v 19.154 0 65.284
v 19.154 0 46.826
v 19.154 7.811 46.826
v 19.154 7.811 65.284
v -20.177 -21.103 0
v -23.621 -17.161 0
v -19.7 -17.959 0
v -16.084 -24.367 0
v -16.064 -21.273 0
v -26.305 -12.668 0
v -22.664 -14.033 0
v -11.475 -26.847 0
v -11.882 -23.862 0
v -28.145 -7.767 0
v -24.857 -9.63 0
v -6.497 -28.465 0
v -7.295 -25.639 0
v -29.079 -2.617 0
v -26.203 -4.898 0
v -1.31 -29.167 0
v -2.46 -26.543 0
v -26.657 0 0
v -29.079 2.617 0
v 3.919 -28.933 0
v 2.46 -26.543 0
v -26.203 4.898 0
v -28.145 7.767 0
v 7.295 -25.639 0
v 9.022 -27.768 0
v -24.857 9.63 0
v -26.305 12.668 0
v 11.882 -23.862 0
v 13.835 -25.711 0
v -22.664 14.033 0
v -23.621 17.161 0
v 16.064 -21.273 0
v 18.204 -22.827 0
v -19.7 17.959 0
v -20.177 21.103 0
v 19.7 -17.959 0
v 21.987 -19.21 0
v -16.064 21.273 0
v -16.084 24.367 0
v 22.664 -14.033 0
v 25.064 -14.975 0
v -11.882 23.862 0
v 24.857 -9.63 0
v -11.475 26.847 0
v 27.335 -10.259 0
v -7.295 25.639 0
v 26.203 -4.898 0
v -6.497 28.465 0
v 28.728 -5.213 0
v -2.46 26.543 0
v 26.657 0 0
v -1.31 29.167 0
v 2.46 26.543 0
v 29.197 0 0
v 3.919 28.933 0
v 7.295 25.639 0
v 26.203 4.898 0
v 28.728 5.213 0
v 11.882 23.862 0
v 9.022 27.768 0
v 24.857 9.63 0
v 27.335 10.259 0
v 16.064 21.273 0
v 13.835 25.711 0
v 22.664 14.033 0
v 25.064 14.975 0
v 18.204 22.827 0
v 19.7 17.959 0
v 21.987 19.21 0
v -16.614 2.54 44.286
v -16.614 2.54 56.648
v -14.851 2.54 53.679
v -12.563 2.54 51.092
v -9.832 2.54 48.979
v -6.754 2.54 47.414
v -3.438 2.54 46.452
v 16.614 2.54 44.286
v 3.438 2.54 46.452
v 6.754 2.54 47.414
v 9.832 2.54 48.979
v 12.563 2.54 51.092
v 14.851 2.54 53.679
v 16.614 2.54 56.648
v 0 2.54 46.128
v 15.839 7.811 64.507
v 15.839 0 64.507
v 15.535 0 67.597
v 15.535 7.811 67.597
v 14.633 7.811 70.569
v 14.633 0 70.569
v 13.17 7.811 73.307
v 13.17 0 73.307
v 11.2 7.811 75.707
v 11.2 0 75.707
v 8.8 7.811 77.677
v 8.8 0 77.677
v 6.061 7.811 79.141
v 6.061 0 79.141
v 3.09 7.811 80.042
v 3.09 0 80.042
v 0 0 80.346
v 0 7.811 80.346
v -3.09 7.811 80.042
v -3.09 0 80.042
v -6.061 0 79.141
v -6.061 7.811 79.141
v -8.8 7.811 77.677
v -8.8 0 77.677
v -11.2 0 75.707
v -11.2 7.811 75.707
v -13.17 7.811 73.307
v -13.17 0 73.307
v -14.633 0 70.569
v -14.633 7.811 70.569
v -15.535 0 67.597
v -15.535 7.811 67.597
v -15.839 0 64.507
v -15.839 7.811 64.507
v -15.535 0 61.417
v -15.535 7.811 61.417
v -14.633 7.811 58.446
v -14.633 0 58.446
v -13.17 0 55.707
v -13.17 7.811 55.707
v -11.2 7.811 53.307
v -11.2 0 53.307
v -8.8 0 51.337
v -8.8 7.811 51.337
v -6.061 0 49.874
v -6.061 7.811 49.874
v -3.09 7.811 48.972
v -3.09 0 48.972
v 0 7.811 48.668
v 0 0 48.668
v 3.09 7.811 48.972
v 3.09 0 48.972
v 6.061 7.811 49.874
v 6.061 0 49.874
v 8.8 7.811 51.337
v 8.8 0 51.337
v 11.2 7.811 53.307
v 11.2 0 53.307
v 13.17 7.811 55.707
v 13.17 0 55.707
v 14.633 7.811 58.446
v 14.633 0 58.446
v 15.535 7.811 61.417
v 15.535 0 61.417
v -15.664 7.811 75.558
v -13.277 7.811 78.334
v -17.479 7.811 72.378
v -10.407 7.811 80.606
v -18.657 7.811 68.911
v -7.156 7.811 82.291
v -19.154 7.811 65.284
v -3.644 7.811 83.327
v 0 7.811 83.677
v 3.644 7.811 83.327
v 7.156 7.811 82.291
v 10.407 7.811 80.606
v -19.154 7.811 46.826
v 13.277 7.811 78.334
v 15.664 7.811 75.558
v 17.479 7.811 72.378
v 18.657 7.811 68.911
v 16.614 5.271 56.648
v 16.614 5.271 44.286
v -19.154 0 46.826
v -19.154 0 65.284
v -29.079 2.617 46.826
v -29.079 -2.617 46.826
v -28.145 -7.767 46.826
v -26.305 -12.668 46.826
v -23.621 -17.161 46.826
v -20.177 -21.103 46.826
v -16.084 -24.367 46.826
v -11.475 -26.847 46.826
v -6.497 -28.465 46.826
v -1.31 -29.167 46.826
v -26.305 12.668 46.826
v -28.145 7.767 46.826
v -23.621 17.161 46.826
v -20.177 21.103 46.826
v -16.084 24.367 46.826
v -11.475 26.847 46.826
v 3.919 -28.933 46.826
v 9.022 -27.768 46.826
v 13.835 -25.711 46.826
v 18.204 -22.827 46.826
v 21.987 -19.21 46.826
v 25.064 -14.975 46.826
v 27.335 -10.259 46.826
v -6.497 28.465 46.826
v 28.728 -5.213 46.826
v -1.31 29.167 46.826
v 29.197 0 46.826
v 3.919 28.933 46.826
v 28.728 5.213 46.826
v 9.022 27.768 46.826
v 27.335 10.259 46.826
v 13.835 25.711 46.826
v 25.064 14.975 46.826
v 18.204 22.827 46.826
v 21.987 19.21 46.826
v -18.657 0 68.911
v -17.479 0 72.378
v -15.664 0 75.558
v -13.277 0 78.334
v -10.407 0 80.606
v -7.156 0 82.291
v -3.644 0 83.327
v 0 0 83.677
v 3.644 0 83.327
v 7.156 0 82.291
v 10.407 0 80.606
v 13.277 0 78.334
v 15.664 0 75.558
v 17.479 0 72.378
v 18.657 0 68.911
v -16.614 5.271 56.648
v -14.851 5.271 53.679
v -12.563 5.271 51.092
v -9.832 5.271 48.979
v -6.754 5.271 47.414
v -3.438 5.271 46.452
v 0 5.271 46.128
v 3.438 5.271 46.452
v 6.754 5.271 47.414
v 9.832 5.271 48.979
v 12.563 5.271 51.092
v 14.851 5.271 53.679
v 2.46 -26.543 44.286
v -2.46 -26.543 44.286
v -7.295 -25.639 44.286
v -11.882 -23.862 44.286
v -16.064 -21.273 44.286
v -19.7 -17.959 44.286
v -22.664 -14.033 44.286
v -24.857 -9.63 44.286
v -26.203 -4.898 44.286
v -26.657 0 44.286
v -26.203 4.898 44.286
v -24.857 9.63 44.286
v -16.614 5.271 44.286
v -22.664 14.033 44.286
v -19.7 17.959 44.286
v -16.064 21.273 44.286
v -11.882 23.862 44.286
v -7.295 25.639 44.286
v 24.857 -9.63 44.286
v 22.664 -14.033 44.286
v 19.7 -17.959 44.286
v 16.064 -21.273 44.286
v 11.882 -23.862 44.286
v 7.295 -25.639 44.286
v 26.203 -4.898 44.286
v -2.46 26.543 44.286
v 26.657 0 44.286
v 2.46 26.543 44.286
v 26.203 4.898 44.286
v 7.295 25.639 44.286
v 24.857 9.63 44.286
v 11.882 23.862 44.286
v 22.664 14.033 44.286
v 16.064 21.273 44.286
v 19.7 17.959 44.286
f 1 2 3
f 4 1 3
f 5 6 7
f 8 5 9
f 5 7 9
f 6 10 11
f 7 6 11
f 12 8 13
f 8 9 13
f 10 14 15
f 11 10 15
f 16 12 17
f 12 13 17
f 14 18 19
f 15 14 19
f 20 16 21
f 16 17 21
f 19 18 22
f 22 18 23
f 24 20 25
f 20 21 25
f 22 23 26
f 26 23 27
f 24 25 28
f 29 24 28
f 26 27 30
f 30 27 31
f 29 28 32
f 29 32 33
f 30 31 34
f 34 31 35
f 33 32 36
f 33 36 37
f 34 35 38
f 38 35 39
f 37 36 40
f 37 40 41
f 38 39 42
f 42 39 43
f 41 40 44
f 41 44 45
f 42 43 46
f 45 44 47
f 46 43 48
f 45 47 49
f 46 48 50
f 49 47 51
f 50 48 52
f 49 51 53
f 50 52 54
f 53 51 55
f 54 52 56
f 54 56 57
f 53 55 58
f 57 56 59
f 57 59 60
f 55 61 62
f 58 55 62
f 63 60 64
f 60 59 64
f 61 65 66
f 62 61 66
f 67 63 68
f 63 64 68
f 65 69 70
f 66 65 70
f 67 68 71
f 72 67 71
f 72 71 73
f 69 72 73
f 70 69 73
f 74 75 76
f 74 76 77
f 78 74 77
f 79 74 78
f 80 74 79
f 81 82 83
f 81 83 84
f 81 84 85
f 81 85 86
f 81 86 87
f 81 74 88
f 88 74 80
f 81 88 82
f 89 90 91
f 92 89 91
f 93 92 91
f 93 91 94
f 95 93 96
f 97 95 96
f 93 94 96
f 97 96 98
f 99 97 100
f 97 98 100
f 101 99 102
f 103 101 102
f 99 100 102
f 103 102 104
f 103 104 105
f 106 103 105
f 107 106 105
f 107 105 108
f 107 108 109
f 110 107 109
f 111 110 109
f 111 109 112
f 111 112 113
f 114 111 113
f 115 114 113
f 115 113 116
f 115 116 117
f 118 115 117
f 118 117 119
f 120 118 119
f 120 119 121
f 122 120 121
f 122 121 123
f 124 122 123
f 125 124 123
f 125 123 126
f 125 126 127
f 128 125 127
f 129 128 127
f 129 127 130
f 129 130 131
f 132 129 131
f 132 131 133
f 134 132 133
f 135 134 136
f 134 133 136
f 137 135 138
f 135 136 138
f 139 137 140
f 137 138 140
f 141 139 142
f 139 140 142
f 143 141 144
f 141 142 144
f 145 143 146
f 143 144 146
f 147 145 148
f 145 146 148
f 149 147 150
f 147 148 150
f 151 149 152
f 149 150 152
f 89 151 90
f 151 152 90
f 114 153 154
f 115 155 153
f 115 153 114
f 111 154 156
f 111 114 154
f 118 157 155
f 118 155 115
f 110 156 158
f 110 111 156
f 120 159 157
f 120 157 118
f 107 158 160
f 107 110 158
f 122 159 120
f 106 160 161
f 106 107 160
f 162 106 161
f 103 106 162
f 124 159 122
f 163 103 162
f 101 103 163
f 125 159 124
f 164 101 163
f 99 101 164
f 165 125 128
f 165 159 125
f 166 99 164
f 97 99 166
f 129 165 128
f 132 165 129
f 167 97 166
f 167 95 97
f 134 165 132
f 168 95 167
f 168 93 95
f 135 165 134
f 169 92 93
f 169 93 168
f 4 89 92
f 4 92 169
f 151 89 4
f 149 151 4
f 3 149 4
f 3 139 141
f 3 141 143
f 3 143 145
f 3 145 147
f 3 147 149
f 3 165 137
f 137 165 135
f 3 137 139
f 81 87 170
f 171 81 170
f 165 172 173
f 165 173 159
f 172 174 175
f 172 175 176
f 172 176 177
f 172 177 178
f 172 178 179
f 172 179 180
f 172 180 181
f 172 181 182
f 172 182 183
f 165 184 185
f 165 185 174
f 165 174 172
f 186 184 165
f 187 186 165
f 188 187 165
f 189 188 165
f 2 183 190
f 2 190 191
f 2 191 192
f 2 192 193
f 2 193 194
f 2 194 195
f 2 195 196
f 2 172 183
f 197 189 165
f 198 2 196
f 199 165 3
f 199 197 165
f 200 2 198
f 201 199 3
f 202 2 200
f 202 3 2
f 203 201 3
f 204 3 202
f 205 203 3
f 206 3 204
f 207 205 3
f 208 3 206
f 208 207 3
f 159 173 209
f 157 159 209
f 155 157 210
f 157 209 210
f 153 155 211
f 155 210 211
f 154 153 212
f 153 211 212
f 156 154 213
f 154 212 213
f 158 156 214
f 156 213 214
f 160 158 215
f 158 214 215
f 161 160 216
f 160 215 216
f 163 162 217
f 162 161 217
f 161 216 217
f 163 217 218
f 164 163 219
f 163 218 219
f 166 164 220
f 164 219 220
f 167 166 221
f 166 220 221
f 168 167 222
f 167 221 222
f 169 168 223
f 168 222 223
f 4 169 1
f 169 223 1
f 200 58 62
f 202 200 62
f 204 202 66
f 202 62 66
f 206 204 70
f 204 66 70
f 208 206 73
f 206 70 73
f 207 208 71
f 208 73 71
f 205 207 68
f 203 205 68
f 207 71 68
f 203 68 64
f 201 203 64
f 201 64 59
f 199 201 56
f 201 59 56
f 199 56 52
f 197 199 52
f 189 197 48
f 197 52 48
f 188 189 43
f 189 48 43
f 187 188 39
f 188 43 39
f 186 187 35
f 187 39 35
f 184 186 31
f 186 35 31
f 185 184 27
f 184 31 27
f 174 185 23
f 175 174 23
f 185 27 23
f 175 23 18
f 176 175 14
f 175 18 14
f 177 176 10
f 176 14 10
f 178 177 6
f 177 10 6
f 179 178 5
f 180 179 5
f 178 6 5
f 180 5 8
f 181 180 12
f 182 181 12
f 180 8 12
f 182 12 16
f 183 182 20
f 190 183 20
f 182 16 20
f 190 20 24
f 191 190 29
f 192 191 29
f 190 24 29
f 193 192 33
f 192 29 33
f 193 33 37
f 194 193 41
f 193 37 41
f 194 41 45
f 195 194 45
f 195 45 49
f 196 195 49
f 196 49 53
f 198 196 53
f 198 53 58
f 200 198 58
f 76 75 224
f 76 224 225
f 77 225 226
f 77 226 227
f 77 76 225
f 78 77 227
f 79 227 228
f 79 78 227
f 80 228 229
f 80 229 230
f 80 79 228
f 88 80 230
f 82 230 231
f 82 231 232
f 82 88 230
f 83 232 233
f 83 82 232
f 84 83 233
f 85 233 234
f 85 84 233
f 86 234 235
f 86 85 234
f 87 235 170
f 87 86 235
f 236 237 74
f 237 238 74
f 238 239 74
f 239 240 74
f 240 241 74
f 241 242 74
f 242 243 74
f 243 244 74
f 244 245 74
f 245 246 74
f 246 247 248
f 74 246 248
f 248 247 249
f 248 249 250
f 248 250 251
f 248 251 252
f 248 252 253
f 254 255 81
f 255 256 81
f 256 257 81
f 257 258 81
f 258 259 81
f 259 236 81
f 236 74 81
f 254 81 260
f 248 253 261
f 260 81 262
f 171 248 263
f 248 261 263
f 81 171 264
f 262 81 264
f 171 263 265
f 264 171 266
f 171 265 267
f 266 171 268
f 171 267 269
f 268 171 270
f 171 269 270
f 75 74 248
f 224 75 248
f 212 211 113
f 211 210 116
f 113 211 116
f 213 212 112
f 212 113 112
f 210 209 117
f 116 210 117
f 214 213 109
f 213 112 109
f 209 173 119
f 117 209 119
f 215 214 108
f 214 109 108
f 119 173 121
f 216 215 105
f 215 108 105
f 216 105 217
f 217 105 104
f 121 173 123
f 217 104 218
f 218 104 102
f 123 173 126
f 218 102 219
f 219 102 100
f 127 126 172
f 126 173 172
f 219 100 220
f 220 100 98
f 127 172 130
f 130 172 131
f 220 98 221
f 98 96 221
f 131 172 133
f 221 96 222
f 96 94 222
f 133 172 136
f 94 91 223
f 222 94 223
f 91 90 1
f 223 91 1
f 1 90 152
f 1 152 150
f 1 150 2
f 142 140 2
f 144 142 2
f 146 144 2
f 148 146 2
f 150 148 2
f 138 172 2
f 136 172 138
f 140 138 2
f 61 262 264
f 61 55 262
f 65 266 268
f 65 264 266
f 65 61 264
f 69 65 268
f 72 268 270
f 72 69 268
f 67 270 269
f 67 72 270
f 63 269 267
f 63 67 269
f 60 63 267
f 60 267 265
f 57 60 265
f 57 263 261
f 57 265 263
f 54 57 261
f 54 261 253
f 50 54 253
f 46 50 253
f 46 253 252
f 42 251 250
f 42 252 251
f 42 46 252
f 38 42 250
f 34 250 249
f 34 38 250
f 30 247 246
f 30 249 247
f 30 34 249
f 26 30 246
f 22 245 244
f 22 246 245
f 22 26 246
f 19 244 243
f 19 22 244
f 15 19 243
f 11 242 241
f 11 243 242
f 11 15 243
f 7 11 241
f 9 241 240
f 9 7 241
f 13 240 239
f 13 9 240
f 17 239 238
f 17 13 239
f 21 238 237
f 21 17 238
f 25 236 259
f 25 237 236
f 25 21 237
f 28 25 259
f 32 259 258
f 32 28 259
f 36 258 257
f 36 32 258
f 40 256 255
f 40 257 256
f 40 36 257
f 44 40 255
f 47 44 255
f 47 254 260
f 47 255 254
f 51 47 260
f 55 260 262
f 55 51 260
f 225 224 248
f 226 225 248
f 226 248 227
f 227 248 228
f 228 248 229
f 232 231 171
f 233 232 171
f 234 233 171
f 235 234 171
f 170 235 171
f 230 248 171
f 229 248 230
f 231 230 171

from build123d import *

# Parameters (mm, degrees)
F0_R     = 29.1968279335
F1_DEPTH = 46.8261539936
F2_W     = 38.307864219
F2_H     = 7.8112371266
F3_DEPTH = 36.9160473347
F4_R     = 15.8391842582
F5_DEPTH = 29.1978279335
F6_T     = -2.54


with BuildPart() as f1:
    # F0 (on Top) → F1 (new body)
    with BuildSketch(Plane.XY):
        Circle(F0_R)
    extrude(amount=F1_DEPTH)

    # F2 (on face) → F3 (join)
    with BuildSketch(Plane.XY.offset(46.8261539936)):
        with Locations((0, 3.9056185633)):
            Rectangle(F2_W, F2_H)
    extrude(amount=F3_DEPTH)

    # F4 (on face) → F5 (cut, through all)
    with BuildSketch(Plane.XZ):
        with Locations((0, 64.5071235189)):
            Circle(F4_R)
        with BuildLine():
            ThreePointArc((-19.1539321095, 65.2841776609), (0, 83.6768112679), (19.1539321095, 65.2841776609))
            Line((19.1539321095, 65.2841776609), (19.1539321095, 83.7422013283))
            Line((19.1539321095, 83.7422013283), (-19.1539321095, 83.7422013283))
            Line((-19.1539321095, 83.7422013283), (-19.1539321095, 65.2841776609))
        make_face()
    extrude(amount=-F5_DEPTH, mode=Mode.SUBTRACT)

    # F6
    f6_openings = [f1.faces().sort_by_distance(p)[0] for p in [
        (0, 0, 0),
    ]]
    offset(amount=F6_T, openings=f6_openings, kind=Kind.INTERSECTION)


solid = f1.part
